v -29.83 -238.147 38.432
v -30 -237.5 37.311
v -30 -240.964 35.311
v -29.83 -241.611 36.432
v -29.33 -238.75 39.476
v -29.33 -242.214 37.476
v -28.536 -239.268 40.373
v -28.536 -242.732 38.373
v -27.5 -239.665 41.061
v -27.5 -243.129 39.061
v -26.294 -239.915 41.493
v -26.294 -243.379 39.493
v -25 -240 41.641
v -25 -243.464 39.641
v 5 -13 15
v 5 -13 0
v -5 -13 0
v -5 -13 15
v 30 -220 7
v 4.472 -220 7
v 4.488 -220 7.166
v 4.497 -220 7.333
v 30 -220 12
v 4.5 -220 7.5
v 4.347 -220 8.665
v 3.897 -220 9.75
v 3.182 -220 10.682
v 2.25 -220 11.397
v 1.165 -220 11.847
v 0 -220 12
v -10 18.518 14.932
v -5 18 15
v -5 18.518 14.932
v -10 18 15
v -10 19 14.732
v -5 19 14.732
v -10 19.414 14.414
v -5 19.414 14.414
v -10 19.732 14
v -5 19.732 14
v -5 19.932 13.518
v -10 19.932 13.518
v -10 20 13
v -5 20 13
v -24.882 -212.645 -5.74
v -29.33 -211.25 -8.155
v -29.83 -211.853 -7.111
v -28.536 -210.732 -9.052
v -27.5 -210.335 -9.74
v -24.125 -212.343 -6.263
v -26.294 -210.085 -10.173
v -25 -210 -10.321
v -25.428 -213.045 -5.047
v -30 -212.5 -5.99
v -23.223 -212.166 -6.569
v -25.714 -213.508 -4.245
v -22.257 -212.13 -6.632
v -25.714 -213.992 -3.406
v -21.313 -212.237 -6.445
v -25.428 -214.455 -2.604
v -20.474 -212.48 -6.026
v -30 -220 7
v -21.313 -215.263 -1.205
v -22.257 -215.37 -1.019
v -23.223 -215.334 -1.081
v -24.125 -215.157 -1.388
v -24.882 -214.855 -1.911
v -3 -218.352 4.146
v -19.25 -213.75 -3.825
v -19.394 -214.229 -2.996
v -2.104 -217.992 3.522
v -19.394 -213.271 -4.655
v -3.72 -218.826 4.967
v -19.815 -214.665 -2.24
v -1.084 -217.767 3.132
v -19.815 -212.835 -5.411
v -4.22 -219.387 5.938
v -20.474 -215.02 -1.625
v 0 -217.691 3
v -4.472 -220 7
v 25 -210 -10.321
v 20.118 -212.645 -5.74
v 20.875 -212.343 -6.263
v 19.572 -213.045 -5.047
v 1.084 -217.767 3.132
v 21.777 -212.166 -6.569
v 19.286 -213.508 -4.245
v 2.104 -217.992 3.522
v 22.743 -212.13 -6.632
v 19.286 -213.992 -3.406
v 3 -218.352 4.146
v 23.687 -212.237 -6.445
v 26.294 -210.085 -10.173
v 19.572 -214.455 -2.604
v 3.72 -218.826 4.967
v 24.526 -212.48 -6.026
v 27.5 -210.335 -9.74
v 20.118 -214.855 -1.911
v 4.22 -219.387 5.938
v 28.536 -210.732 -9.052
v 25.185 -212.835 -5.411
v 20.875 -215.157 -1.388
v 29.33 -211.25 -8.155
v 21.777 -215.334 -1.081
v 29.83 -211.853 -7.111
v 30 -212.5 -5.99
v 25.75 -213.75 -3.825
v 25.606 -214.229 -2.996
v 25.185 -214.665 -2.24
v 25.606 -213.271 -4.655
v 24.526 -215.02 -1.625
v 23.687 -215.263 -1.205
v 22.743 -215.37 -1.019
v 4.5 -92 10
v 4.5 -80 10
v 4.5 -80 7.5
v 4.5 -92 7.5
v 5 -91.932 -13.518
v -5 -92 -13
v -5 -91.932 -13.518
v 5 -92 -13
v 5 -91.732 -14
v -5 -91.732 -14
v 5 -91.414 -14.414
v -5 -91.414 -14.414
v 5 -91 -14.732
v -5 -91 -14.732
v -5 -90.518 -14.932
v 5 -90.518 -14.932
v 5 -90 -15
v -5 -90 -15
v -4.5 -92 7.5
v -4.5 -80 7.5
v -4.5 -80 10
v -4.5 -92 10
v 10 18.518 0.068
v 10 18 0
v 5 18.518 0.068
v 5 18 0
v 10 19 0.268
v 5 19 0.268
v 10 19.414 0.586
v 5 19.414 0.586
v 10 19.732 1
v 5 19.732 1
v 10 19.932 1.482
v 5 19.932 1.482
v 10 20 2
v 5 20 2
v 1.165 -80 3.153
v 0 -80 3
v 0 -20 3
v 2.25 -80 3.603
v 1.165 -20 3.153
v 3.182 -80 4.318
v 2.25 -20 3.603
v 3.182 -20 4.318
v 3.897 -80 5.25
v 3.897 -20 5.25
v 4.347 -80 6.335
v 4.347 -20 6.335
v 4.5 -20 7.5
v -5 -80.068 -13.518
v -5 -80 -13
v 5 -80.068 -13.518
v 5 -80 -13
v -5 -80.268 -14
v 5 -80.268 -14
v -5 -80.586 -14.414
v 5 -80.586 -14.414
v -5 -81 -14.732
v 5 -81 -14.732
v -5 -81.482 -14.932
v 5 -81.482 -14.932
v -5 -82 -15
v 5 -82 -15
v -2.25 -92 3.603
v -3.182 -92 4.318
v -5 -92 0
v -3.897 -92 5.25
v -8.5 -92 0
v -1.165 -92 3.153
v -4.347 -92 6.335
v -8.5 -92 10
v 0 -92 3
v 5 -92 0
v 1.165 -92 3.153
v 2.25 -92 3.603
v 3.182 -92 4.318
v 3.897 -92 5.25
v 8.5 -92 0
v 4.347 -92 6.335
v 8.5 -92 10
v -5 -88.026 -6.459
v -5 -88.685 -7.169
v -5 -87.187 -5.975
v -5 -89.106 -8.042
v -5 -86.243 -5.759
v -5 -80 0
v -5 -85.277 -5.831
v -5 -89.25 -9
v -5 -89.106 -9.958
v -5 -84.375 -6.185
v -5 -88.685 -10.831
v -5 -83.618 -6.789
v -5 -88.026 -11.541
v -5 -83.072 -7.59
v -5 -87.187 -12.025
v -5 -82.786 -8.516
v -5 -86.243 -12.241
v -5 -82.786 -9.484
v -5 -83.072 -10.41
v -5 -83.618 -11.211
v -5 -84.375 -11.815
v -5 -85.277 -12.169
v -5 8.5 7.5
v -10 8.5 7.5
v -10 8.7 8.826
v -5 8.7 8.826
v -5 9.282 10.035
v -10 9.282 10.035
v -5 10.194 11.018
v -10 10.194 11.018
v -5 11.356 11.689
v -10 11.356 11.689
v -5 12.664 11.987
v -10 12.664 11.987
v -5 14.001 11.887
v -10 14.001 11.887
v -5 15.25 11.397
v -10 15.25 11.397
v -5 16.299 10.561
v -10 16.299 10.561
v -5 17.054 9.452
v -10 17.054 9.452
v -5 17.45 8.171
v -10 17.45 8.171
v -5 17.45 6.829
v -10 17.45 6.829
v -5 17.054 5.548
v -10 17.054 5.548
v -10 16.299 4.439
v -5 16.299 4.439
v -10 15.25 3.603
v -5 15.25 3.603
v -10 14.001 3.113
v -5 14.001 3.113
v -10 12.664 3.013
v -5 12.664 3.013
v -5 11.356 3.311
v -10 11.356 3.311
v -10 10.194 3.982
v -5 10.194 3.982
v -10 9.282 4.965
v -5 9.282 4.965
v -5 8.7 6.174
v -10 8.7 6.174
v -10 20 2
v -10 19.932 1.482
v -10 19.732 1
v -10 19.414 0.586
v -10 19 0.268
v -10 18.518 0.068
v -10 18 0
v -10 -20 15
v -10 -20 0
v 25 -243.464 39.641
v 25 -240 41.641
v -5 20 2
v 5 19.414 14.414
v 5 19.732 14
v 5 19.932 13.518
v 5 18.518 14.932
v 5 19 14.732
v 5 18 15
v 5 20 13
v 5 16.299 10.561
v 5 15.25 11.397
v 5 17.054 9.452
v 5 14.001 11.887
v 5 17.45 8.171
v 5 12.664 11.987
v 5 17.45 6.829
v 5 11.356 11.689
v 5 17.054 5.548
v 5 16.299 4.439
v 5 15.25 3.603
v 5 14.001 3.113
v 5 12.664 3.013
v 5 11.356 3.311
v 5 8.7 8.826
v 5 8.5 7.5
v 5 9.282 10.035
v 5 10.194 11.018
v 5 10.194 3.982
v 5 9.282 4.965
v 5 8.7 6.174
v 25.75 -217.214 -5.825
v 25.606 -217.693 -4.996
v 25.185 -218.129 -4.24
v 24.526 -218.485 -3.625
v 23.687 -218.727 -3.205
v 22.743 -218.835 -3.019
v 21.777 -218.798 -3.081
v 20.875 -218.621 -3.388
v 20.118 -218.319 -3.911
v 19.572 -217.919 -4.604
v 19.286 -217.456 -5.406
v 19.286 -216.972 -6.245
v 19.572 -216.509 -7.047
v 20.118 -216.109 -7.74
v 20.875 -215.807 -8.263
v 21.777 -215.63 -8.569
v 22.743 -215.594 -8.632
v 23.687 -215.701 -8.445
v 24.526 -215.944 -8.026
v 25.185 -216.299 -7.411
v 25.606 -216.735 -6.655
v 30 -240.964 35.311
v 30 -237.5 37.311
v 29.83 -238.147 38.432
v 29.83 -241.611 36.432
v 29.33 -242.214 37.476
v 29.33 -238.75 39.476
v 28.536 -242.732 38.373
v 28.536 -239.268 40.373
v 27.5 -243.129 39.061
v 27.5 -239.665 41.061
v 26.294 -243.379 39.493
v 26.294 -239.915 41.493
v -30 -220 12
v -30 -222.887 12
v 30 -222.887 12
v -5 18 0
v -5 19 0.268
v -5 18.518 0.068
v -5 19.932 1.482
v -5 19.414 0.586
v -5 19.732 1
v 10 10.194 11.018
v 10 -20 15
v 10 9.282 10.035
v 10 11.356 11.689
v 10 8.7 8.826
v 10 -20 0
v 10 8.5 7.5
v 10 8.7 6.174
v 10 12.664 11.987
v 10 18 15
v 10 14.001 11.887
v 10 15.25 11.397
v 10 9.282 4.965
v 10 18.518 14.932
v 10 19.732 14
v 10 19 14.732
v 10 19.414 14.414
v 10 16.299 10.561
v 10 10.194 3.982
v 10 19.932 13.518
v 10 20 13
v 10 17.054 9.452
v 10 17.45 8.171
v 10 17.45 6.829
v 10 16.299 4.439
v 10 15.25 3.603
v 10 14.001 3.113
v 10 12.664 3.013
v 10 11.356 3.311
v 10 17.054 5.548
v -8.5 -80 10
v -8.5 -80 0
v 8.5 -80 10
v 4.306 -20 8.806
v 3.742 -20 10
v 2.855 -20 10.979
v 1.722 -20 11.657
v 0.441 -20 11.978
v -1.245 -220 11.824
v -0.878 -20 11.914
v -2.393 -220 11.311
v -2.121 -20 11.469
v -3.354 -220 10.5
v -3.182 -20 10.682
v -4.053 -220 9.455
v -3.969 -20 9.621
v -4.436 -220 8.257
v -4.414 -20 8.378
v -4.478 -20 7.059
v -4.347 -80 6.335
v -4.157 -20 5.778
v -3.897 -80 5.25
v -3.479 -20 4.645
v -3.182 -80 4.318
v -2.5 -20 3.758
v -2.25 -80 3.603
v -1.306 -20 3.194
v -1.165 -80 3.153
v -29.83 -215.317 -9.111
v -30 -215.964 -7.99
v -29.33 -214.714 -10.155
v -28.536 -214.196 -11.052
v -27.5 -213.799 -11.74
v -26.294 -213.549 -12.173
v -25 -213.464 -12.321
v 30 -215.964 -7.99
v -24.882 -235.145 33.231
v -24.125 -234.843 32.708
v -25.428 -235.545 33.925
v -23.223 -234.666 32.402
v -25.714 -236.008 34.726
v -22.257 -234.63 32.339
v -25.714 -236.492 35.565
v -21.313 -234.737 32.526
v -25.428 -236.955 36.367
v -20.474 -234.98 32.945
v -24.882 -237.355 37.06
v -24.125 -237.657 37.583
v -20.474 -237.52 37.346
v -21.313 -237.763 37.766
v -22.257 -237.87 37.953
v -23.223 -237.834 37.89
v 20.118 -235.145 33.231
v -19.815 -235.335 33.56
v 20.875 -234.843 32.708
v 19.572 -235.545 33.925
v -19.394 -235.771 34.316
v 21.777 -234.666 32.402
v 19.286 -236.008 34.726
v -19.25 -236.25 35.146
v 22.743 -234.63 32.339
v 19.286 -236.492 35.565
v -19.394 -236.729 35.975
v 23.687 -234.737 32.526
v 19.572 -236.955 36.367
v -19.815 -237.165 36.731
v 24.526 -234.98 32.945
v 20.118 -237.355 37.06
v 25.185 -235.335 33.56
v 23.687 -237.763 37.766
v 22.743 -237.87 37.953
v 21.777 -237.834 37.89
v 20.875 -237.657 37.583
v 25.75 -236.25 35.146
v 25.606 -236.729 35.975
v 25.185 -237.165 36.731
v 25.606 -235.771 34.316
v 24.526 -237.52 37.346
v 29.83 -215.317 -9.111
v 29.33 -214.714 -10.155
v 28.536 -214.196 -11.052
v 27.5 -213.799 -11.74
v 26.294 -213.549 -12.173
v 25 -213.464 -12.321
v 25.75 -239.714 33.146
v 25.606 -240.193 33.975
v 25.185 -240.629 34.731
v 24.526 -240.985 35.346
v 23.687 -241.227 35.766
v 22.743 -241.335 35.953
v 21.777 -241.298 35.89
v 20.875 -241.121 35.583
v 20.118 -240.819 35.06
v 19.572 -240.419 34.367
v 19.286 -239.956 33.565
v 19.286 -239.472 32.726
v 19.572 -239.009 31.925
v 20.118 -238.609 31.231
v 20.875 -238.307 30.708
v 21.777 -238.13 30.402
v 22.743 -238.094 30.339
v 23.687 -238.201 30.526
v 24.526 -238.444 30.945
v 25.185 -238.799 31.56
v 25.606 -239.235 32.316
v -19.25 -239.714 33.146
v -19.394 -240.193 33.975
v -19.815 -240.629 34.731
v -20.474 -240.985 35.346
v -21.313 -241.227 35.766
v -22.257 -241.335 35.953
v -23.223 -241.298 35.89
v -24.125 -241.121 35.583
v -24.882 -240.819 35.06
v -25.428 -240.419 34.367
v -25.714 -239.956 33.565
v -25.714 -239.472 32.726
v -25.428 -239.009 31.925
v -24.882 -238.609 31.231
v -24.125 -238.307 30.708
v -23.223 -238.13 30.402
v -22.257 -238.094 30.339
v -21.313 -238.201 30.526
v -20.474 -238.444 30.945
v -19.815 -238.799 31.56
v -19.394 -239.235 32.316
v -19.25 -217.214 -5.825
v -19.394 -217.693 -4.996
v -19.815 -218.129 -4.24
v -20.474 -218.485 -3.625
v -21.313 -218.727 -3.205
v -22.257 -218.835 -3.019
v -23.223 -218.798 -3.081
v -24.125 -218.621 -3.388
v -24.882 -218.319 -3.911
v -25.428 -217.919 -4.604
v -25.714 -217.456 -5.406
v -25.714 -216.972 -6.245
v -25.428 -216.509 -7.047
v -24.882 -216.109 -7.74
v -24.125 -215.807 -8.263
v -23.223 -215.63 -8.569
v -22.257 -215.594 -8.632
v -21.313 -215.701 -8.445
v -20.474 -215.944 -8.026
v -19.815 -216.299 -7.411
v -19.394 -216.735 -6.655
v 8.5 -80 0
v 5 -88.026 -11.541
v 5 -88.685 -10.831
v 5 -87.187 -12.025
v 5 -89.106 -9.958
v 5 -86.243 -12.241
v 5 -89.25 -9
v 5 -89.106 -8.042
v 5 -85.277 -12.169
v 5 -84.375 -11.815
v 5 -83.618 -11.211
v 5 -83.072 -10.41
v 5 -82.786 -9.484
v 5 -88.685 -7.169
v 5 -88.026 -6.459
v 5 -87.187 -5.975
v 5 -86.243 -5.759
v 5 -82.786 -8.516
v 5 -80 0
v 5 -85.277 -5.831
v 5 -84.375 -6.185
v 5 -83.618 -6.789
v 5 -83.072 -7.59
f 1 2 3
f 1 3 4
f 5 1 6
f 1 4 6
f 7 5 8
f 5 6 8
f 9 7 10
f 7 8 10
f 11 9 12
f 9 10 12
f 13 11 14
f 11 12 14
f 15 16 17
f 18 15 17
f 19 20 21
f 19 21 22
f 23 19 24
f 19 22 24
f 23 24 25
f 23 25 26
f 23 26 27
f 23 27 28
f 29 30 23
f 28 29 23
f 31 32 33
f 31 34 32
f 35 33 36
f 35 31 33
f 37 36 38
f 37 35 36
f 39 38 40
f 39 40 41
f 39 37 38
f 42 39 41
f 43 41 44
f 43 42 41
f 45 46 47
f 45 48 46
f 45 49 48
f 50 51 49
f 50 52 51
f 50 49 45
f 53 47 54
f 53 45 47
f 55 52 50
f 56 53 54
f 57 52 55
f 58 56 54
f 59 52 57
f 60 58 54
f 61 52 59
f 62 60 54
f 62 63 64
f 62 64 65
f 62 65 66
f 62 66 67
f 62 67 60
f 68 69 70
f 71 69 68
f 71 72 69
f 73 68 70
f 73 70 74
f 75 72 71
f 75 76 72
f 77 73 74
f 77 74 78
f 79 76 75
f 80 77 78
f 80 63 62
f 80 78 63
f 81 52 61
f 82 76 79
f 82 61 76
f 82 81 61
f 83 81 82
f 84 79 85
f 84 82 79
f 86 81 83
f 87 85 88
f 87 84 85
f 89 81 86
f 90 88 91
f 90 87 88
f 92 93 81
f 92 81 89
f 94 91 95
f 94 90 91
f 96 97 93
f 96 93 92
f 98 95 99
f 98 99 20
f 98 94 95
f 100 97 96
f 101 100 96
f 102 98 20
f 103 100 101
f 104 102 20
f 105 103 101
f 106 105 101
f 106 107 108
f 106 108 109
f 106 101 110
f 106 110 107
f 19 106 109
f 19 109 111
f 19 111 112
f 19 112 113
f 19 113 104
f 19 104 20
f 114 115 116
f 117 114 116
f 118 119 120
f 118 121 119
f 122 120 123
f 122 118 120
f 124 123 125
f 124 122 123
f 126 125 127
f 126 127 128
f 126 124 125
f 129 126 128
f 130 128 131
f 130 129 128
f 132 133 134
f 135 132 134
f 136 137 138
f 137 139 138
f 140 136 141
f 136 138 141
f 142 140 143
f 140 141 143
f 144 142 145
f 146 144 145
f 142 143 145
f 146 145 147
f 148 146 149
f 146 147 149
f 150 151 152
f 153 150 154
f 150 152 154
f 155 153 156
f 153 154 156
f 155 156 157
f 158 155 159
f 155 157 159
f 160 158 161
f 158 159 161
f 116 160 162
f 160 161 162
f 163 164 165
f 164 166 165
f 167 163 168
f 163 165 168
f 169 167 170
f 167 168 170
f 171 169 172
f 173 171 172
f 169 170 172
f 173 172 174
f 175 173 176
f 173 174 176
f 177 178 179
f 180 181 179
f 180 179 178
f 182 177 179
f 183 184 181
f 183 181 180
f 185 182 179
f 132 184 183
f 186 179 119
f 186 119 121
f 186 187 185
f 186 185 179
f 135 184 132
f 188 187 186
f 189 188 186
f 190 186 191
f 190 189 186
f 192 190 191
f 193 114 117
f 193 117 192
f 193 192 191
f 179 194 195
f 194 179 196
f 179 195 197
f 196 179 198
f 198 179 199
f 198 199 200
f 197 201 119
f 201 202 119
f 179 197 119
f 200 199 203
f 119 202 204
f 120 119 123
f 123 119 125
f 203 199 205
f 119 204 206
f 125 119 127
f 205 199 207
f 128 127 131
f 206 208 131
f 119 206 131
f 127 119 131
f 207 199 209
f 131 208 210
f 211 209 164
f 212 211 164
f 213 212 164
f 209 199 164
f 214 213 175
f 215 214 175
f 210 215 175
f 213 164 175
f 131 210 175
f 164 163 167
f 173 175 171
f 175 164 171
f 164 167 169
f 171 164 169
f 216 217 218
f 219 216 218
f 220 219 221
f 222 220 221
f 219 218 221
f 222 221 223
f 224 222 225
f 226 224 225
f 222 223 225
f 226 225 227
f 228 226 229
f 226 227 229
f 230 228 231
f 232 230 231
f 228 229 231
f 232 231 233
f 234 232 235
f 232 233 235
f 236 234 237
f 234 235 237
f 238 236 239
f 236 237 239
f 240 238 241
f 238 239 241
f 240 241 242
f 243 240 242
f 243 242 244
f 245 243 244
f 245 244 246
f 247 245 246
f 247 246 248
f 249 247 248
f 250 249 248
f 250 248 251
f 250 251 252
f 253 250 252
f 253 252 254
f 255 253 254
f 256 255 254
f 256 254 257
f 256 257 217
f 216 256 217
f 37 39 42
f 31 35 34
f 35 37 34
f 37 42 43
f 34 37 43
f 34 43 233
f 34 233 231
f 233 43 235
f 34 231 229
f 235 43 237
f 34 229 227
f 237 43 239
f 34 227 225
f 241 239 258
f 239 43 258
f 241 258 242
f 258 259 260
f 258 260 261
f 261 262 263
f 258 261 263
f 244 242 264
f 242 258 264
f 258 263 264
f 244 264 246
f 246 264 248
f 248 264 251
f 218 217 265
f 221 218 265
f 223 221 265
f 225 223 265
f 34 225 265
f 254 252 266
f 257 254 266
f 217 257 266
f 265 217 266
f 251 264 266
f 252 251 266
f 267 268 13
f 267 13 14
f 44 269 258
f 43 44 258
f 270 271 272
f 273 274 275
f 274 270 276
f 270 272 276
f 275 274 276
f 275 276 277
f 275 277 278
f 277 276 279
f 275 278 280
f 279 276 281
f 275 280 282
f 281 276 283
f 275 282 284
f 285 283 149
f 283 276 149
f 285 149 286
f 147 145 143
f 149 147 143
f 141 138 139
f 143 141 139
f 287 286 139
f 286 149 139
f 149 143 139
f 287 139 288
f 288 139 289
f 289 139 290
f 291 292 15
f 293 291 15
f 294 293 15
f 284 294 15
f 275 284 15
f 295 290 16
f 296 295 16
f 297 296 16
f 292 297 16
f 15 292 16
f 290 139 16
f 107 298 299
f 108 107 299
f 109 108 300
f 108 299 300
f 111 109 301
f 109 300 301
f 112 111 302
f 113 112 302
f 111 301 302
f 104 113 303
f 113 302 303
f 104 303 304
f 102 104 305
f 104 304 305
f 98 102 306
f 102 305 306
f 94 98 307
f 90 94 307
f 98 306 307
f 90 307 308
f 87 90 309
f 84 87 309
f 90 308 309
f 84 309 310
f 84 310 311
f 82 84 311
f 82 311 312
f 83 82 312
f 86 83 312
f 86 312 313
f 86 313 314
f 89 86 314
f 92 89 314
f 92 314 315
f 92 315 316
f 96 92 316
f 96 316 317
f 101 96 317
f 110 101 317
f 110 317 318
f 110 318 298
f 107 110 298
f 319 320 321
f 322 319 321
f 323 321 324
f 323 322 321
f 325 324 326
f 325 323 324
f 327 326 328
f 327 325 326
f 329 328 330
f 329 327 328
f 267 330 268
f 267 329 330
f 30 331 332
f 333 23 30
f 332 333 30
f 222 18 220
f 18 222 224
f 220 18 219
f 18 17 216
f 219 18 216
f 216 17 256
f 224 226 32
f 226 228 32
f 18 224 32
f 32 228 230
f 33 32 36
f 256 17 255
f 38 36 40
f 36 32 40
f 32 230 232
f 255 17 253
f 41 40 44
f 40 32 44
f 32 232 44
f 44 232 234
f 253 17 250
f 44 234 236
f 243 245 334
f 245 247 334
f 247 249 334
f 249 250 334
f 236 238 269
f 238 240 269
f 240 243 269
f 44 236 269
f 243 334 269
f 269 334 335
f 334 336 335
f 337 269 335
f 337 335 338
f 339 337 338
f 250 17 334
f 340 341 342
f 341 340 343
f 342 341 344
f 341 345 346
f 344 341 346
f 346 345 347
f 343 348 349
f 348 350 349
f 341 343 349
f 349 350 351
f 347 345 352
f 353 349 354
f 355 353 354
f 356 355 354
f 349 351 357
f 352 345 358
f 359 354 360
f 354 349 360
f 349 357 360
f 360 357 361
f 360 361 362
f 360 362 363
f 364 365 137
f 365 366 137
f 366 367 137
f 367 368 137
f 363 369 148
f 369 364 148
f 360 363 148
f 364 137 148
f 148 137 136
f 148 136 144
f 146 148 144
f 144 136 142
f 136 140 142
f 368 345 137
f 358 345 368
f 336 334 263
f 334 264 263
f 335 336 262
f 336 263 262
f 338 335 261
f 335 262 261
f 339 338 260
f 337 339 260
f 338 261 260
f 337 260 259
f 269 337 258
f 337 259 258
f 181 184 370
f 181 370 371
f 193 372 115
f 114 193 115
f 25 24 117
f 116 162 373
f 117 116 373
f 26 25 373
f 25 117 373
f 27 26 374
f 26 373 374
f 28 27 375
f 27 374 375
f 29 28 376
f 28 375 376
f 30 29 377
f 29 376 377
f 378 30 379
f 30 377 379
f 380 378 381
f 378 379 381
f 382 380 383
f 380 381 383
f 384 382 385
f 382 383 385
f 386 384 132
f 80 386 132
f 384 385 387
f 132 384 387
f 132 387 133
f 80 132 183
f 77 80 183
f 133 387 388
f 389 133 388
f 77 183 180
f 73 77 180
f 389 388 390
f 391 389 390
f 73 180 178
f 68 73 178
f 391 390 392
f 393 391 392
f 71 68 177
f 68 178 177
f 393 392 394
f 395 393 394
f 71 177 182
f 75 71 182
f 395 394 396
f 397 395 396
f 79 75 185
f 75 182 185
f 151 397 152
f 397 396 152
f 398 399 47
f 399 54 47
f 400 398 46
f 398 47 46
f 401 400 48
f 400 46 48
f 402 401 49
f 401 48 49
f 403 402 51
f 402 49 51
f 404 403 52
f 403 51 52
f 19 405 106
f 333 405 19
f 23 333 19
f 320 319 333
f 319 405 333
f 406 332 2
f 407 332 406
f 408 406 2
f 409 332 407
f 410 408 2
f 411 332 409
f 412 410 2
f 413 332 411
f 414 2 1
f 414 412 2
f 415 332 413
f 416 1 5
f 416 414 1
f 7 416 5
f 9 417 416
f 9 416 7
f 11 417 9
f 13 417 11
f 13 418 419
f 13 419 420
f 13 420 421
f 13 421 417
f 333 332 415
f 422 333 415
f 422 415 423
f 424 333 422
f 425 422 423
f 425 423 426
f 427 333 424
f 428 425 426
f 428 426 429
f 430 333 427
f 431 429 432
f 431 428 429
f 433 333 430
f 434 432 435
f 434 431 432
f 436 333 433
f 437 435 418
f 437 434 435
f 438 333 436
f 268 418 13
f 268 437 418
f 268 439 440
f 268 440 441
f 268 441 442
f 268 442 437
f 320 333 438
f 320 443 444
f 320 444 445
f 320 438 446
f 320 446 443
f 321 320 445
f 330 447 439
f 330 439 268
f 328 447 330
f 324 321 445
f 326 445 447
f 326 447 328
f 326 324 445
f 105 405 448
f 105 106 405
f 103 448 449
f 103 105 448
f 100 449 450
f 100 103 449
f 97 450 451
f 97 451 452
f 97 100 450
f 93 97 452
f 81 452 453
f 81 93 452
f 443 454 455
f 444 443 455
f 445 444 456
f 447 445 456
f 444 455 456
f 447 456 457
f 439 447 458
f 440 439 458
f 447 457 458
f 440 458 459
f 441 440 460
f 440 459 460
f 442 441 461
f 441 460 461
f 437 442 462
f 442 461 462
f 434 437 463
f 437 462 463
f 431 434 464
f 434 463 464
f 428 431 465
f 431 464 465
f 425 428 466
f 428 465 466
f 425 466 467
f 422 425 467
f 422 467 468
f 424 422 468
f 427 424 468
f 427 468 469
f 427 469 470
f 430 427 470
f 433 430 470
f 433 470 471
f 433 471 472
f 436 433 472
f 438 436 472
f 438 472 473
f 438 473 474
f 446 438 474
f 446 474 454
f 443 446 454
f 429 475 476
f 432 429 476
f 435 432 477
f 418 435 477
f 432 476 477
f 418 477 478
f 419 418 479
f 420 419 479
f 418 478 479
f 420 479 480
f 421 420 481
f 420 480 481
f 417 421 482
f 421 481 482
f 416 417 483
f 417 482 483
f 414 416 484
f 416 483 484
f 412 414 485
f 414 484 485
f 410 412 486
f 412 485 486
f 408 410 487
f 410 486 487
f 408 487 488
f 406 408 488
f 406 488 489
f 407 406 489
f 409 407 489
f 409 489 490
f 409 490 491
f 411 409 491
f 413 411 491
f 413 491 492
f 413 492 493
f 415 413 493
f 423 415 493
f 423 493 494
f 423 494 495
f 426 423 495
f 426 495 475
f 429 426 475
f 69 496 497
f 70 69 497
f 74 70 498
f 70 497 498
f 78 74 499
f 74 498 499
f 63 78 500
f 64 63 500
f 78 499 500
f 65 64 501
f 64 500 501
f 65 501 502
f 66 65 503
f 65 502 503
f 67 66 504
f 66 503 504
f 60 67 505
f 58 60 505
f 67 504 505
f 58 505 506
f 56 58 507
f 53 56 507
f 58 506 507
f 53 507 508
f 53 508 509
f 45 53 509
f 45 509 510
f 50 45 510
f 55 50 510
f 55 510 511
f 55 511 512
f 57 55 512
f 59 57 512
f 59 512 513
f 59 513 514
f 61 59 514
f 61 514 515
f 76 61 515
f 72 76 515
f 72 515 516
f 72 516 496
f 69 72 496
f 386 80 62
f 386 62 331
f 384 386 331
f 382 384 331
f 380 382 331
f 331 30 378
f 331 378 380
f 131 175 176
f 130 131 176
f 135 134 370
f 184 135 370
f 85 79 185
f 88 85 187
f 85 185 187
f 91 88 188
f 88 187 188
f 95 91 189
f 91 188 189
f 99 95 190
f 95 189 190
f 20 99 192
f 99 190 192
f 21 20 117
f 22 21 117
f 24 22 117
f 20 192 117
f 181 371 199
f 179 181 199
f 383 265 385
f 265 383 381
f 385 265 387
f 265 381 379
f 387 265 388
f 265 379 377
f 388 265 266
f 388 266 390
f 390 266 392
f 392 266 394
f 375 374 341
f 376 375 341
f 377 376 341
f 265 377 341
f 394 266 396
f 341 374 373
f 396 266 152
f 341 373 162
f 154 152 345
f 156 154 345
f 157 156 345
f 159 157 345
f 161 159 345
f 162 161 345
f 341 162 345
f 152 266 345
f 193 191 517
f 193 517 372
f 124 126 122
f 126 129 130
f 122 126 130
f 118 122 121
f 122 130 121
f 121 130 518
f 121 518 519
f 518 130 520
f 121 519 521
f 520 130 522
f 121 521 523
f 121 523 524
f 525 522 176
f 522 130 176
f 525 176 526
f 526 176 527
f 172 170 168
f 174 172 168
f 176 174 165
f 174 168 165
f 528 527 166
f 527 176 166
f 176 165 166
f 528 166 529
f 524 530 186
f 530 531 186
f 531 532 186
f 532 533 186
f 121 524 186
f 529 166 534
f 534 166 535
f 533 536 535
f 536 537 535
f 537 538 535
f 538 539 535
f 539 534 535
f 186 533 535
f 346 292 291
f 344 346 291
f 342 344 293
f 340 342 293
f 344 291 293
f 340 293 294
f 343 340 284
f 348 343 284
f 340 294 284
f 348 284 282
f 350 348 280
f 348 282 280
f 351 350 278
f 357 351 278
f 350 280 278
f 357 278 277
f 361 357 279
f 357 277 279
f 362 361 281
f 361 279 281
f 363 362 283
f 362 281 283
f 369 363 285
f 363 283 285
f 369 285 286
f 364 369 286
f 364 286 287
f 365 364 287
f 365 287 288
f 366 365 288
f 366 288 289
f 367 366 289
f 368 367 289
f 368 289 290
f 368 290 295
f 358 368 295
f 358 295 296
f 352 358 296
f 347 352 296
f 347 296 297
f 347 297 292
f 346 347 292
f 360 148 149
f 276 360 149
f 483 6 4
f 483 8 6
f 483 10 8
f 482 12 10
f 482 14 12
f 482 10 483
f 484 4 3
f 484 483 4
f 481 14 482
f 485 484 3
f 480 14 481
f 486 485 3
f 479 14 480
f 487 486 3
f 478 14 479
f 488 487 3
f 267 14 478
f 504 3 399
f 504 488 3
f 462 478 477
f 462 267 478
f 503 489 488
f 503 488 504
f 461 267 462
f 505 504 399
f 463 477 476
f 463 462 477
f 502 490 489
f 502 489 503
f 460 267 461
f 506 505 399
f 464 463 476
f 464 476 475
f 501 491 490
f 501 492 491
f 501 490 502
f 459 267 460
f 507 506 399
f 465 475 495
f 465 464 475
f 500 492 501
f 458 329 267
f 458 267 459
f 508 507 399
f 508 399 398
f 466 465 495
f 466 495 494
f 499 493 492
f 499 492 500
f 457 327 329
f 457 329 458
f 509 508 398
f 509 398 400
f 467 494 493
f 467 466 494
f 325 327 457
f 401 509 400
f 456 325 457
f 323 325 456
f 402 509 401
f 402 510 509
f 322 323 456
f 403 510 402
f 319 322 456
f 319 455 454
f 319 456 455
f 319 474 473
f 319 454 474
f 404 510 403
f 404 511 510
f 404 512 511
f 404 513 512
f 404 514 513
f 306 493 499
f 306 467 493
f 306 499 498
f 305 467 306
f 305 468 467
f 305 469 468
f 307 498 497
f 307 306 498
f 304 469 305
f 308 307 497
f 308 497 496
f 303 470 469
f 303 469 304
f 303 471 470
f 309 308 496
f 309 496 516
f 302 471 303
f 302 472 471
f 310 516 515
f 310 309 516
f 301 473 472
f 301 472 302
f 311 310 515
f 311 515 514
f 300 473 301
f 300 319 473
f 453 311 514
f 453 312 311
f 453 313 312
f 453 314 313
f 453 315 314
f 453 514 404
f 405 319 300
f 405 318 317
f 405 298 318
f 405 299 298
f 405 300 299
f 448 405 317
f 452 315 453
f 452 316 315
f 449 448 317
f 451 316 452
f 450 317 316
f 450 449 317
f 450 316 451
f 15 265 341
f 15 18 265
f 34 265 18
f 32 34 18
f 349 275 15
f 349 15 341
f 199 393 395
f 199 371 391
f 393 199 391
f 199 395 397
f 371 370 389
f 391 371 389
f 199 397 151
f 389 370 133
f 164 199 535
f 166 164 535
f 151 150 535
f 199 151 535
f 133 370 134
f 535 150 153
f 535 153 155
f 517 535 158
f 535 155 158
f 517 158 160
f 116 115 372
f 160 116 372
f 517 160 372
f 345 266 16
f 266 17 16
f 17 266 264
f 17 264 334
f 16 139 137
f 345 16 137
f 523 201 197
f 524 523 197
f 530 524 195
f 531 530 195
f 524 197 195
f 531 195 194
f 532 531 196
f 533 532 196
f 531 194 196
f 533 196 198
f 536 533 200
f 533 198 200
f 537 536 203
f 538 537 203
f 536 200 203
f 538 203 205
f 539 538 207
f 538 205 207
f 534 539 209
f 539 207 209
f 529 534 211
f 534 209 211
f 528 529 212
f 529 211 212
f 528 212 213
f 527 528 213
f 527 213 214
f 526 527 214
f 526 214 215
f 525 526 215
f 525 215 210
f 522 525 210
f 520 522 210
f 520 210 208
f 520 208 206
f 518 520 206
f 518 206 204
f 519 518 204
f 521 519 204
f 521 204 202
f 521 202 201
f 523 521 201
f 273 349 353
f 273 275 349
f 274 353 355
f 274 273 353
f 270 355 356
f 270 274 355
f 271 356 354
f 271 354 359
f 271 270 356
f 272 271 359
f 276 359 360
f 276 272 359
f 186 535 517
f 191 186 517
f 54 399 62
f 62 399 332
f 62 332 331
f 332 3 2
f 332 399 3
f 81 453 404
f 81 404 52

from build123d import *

# Parameters (mm, degrees)
F1_DEPTH      = 15
F3_DEPTH      = 200
F4_R          = 4.5
F5_DEPTH      = 25
F6_R          = 2
F8_DEPTH      = 30
F8_DEPTH_BACK = 30
F9_R          = 3.25
F10_DEPTH     = 25
F13_DEPTH     = 12
F14_R         = 3.25
F15_DEPTH     = 25
F16_R         = 2
F17_R         = 5


with BuildPart() as f1:
    # F0 (on Top) → F1 (new body)
    with BuildSketch(Plane.XY):
        Polygon((-10, -20), (10, -20), (10, 20), (5, 20), (5, -13), (-5, -13), (-5, 20), (-10, 20), align=None)
    extrude(amount=F1_DEPTH)

    # F2 (on face) → F3 (join)
    with BuildSketch(Plane.XZ.offset(20)):
        with BuildLine():
            ThreePointArc((0, 3), (3.1819805153, 4.3180194847), (4.5, 7.5))
            ThreePointArc((4.5, 7.5), (-3.1819805153, 10.6819805153), (0, 3))
        make_face()
    extrude(amount=F3_DEPTH)

    # F4 (on face) → F5 (cut)
    with BuildSketch(Plane(origin=(-10, 0, 0), x_dir=(0, -1, 0), z_dir=(-1, 0, 0))):
        with Locations((-13, 7.5)):
            Circle(F4_R)
    extrude(amount=-F5_DEPTH, mode=Mode.SUBTRACT)

    # F6
    f6_edges = [f1.edges().sort_by_distance(p)[0] for p in [
        (-7.5, 20, 15),
        (7.5, 20, 15),
        (7.5, 20, 0),
        (-7.5, 20, 0),
    ]]
    fillet(f6_edges, radius=F6_R)

    # F7 (on Right) → F8 (join, two sides)
    with BuildSketch(Plane.YZ) as f8_sk:
        Polygon((-210, -10.3205080757), (-220, 7), (-222.8867513459, 12), (-240, 41.6410161514), (-243.4641016151, 39.6410161514), (-213.4641016151, -12.3205080757), align=None)
        Polygon((-222.8867513459, 12), (-220, 7), (-220, 12), align=None)
    extrude(amount=F8_DEPTH)
    extrude(f8_sk.sketch, amount=-F8_DEPTH_BACK)

    # F9 (on face) → F10 (cut)
    with BuildSketch(Plane(origin=(0, -165.4330127019, -95.5127944163), x_dir=(1, 0, 0), z_dir=(0, -0.8660254038, -0.5))):
        with Locations((-22.5, 148.5621778265)):
            Circle(F9_R)
        with Locations((22.5, 148.5621778265)):
            Circle(F9_R)
        with Locations((-22.5, 103.5621778265)):
            Circle(F9_R)
        with Locations((22.5, 103.5621778265)):
            Circle(F9_R)
    extrude(amount=-F10_DEPTH, mode=Mode.SUBTRACT)

    # F12 (on offset) → F13 (join)
    with BuildSketch(Plane.XZ.offset(80)):
        with BuildLine():
            Line((-5, 0), (-5, -15))
            Line((-5, -15), (5, -15))
            Line((5, -15), (5, 0))
            Line((5, 0), (8.5, 0))
            Line((8.5, 0), (8.5, 10))
            Line((8.5, 10), (4.5, 10))
            Line((4.5, 10), (4.5, 7.5))
            ThreePointArc((4.5, 7.5), (0, 3), (-4.5, 7.5))
            Line((-4.5, 7.5), (-4.5, 10))
            Line((-4.5, 10), (-8.5, 10))
            Line((-8.5, 10), (-8.5, 0))
            Line((-8.5, 0), (-5, 0))
        make_face()
    extrude(amount=F13_DEPTH)

    # F14 (on face) → F15 (cut)
    with BuildSketch(Plane(origin=(-5, 0, 0), x_dir=(0, -1, 0), z_dir=(-1, 0, 0))):
        with Locations((86, -9)):
            Circle(F14_R)
    extrude(amount=-F15_DEPTH, mode=Mode.SUBTRACT)

    # F16
    f16_edges = [f1.edges().sort_by_distance(p)[0] for p in [
        (0, -80, -15),
        (0, -92, -15),
    ]]
    fillet(f16_edges, radius=F16_R)

    # F17
    f17_edges = [f1.edges().sort_by_distance(p)[0] for p in [
        (-30, -241.732051, 40.641016),
        (30, -241.732051, 40.641016),
        (-30, -211.732051, -11.320508),
        (30, -211.732051, -11.320508),
    ]]
    fillet(f17_edges, radius=F17_R)


solid = f1.part
